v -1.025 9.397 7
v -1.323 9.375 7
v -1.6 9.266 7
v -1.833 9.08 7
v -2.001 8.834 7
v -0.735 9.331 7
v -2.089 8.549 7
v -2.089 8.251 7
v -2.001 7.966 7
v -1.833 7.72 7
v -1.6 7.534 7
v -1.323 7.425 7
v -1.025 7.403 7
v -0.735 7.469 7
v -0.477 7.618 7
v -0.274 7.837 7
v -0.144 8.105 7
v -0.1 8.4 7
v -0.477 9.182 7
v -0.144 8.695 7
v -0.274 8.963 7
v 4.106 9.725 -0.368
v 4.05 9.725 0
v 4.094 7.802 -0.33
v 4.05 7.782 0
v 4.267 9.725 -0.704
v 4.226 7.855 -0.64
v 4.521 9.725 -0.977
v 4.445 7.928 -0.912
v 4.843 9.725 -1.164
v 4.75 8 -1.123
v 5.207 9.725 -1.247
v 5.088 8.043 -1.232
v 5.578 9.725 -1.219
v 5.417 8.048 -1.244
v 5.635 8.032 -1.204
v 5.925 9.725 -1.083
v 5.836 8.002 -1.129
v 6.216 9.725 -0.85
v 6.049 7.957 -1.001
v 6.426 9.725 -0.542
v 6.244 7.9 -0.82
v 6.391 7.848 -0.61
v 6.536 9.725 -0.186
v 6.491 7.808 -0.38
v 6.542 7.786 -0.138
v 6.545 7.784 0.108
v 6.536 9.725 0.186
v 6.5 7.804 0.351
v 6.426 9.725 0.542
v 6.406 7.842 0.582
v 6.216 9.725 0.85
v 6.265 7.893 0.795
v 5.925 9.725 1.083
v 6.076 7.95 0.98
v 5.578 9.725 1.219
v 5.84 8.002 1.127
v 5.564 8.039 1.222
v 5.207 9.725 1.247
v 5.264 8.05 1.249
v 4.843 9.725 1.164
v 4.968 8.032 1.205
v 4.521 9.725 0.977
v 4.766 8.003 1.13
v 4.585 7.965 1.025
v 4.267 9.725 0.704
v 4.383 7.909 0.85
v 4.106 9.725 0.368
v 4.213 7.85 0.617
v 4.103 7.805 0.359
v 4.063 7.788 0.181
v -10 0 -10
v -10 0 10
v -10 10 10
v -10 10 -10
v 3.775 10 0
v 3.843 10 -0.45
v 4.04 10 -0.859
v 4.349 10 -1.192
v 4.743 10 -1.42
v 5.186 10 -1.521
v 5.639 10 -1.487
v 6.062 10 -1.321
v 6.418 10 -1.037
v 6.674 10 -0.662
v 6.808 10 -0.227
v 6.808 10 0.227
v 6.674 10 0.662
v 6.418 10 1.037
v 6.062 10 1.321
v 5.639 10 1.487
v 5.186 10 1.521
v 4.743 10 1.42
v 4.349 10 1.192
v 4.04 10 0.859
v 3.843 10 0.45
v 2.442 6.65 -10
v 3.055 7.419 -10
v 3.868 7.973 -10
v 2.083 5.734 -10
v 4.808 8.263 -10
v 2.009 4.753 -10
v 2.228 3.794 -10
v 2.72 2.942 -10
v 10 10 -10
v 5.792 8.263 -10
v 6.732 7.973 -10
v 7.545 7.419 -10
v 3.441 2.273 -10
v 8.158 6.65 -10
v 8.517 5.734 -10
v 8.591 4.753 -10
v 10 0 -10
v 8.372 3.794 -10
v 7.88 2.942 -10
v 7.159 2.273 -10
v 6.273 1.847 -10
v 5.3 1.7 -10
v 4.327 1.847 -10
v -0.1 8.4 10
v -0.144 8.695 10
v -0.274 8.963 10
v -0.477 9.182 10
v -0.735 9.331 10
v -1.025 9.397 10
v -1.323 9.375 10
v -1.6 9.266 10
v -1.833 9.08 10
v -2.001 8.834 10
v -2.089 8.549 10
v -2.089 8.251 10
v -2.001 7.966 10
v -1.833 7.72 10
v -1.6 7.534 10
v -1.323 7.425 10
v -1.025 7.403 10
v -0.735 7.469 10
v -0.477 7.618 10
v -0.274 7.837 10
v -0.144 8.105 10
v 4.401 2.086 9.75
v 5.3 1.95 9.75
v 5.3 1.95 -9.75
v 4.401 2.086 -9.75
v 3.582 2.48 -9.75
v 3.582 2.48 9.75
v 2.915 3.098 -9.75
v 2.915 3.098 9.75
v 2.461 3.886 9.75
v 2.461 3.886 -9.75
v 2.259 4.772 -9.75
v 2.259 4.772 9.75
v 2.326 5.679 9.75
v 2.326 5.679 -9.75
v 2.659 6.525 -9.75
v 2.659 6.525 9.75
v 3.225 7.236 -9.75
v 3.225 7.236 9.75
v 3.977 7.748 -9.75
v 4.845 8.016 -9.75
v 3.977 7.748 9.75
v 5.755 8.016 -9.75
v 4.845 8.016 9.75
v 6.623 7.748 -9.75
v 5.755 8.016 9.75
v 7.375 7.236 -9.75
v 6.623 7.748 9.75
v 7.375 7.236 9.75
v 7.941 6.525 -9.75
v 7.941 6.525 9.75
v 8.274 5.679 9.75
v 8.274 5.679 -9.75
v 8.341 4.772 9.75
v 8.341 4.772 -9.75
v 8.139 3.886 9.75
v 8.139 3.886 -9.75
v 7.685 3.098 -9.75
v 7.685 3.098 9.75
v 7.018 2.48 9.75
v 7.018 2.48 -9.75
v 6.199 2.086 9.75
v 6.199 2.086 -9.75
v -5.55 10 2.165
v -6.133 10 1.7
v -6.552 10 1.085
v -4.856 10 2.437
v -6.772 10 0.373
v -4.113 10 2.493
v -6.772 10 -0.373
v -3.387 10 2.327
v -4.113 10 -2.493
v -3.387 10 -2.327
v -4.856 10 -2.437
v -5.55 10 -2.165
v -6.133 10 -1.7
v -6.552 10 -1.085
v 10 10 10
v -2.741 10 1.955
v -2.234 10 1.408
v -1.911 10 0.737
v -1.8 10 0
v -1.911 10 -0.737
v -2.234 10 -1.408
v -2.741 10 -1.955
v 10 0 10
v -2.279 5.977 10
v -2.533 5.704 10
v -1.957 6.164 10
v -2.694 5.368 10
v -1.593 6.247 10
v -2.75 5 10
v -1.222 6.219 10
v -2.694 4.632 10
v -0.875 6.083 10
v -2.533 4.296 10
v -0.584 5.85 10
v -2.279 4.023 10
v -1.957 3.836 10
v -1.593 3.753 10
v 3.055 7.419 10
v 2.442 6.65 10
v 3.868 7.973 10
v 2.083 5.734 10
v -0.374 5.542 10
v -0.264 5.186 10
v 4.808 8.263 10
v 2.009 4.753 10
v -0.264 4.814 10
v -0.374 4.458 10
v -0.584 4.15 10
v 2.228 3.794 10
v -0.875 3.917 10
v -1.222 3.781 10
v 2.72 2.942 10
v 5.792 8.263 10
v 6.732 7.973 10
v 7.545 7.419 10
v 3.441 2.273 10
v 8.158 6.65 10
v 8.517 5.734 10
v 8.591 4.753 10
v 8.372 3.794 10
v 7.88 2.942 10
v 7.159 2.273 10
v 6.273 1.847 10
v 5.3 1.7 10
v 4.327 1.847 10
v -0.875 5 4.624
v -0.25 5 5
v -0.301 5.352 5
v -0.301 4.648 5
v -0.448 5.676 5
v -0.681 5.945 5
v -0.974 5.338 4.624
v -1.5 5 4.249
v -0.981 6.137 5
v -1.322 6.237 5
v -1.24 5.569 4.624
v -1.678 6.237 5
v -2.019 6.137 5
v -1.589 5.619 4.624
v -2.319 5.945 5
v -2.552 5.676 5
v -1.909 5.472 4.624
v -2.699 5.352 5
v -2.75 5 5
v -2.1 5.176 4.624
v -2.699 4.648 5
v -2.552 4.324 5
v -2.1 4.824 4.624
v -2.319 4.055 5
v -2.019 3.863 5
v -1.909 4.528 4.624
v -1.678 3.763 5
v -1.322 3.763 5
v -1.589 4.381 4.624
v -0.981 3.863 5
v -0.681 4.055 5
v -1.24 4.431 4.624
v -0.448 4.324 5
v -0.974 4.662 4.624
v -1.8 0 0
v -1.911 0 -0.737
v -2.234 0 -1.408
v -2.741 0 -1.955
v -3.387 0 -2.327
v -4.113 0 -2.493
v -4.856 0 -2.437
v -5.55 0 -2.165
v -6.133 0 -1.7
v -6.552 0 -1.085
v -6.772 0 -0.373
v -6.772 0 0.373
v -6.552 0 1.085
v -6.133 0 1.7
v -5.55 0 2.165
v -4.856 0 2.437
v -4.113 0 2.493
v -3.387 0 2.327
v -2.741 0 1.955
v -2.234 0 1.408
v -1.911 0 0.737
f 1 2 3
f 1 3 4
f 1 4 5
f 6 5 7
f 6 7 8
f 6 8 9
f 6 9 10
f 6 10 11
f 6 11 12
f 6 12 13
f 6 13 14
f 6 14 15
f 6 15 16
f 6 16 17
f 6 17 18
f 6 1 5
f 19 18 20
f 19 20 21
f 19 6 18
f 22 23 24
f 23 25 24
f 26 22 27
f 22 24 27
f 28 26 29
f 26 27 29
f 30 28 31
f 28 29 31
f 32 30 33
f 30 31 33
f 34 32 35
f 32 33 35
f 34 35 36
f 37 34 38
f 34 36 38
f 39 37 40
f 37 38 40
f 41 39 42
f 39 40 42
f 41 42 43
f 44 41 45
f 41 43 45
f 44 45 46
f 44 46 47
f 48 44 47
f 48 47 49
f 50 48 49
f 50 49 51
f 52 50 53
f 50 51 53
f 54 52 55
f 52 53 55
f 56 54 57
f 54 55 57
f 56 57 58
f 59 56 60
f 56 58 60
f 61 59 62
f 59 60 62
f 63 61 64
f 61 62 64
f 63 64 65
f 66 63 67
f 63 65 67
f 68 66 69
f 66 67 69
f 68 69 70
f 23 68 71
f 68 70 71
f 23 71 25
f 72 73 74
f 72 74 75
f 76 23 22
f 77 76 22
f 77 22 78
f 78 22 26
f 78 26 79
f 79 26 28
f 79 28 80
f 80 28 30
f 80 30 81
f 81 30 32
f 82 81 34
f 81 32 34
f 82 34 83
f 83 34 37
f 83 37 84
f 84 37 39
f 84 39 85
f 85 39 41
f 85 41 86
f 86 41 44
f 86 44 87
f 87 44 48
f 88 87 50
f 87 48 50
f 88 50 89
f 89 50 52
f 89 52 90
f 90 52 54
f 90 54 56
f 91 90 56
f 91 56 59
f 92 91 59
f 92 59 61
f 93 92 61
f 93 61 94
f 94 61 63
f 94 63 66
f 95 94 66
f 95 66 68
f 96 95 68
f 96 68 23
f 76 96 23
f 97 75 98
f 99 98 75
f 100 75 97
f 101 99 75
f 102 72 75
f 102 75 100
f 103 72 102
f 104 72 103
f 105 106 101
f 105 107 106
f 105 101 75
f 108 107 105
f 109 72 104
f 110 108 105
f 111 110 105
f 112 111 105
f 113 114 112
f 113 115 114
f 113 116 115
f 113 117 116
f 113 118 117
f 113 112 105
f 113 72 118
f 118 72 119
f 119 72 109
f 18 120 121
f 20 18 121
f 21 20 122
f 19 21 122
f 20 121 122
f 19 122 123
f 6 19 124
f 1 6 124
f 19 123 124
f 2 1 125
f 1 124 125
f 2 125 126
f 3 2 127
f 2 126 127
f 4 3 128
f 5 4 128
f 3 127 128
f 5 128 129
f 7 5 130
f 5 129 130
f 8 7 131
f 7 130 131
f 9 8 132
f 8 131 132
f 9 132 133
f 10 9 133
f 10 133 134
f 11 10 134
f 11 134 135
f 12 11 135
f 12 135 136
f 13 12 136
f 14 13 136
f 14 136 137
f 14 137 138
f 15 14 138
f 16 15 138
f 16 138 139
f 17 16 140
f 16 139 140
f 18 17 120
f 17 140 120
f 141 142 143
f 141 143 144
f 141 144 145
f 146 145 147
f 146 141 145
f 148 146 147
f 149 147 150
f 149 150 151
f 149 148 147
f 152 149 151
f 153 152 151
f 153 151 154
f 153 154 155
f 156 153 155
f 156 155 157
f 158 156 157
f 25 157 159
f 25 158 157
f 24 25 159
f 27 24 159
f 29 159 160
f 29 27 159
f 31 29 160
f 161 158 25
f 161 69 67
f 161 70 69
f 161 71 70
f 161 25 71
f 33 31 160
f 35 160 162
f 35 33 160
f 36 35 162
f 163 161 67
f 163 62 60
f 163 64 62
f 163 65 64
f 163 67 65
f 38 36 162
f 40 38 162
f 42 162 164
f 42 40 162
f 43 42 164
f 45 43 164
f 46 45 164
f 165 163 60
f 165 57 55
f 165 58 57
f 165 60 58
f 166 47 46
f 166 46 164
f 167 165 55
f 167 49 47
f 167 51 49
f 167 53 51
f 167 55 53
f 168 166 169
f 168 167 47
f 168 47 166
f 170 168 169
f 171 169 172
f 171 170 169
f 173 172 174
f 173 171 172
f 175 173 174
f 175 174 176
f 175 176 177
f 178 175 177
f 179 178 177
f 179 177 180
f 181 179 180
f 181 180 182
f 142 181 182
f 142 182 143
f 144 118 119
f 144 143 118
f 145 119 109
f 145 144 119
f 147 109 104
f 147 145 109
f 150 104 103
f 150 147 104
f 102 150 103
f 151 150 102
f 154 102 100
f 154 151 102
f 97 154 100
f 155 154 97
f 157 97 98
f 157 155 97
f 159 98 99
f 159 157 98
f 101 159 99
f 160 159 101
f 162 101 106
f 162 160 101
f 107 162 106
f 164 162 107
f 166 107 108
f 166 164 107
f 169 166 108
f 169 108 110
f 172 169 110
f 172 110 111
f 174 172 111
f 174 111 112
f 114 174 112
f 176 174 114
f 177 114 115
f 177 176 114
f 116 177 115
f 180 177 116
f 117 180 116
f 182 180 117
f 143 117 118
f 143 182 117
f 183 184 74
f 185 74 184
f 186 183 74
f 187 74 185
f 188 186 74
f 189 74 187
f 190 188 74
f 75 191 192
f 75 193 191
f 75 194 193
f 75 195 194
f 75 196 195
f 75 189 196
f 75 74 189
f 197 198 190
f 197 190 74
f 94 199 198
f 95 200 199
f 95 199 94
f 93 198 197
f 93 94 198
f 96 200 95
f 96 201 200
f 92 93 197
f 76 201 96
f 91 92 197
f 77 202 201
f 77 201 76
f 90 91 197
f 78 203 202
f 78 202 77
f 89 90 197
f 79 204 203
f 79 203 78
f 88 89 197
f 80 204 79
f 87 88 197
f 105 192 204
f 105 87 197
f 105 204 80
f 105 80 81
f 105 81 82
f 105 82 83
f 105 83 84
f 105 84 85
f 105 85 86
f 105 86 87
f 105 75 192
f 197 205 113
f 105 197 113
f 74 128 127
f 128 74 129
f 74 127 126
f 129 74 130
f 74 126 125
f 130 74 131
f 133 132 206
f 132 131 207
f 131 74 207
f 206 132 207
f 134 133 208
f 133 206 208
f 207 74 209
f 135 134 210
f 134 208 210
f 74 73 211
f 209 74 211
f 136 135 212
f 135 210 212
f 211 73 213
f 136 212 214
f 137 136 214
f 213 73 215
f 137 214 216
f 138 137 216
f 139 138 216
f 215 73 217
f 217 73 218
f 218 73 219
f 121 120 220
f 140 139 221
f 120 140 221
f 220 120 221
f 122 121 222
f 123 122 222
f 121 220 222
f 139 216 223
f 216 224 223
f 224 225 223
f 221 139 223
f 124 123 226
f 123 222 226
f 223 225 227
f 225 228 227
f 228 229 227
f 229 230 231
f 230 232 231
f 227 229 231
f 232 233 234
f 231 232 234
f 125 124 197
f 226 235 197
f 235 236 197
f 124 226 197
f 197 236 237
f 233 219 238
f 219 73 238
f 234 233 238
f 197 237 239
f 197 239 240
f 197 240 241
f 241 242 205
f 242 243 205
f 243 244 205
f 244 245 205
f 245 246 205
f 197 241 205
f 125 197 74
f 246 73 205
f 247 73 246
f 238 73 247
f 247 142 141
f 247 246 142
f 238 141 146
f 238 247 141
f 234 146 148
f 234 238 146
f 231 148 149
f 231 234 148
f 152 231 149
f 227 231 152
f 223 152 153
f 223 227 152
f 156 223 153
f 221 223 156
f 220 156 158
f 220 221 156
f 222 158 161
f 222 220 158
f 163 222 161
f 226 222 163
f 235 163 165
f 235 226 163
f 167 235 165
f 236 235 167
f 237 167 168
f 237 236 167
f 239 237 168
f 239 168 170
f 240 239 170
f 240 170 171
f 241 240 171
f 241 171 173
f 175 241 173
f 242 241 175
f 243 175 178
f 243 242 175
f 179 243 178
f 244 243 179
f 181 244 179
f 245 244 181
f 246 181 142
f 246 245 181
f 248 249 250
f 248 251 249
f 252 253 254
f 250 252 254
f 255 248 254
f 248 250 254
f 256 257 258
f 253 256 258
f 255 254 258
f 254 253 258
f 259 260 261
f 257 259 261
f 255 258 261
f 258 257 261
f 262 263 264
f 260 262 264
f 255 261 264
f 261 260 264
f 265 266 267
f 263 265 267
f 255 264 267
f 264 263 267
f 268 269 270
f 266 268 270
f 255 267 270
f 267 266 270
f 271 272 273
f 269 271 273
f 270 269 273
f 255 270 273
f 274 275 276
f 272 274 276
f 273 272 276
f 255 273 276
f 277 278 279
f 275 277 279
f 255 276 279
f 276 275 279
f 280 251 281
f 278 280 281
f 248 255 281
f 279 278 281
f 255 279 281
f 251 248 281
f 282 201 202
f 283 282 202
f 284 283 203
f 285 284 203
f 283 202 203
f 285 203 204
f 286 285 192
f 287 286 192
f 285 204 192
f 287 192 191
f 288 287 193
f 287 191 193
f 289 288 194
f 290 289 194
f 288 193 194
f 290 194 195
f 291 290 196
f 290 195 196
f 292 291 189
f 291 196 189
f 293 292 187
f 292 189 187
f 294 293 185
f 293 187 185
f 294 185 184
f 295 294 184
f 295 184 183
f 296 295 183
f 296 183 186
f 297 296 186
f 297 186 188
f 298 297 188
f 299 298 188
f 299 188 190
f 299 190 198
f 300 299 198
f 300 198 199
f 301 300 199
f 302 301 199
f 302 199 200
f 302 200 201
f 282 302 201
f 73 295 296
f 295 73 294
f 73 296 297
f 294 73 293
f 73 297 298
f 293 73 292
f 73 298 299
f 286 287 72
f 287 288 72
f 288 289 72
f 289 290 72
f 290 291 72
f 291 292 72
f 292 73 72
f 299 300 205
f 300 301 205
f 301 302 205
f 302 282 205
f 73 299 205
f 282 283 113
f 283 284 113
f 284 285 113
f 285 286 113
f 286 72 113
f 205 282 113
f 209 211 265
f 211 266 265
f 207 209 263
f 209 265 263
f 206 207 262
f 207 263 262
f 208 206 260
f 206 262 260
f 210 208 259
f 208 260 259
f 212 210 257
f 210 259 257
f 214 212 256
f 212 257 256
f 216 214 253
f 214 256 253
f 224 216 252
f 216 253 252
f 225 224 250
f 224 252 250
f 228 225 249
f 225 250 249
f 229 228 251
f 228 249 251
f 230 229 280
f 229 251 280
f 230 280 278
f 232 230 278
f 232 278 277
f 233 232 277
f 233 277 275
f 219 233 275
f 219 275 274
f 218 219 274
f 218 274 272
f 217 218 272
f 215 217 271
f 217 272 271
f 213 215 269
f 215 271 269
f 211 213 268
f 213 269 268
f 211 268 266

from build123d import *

# Parameters (mm, degrees)
SKETCH_1_W                   = 20
SKETCH_1_H                   = 20
EXTRUDE_1_DEPTH              = 10
HOLE_WIZARD_M3_2_D           = 2.5
HOLE_WIZARD_M3_2_DEPTH       = 5
HOLE_WIZARD_M3_2_TIP         = 0.751075774
HOLE_WIZARD_M3_3_D           = 2.5
HOLE_WIZARD_M3_3_DEPTH       = 6
HOLE_WIZARD_M3_3_CSINK_D     = 3.05
HOLE_WIZARD_M3_3_CSINK_ANGLE = 90
HOLE_WIZARD_M3_3_TIP         = 1.25
SKETCH_23_R                  = 2.5
CUT_EXTRUDE_1_DEPTH          = 11
SKETCH_40_R                  = 1
CUT_EXTRUDE_2_DEPTH          = 3


with BuildPart() as part:
    # 草图1 → 凸台-拉伸1 (new body)
    with BuildSketch(Plane(origin=(0, 0, 0), x_dir=(1, 0, 0), z_dir=(0, 1, 0))):
        Rectangle(SKETCH_1_W, SKETCH_1_H)
    extrude(amount=EXTRUDE_1_DEPTH)

    # 草图26 → Ø6.1 (6.1) 直径孔1 (revolve, cut)
    with BuildSketch(Plane(origin=(5.3, 5, 10), x_dir=(0, -1, 0), z_dir=(1, 0, 0))):
        Polygon((0, 0), (0, 20), (3.3, 20), (3.05, 19.75), (3.05, 0.25), (3.3, 0), align=None)
    revolve(axis=Axis((5.3, 5, 16.35), (0, 0, -1)), mode=Mode.SUBTRACT)

    # M3 螺纹孔2
    with Locations(Plane.XY.offset(10)):
        with Locations((-1.5, 5)):
            Hole(HOLE_WIZARD_M3_2_D / 2, depth=HOLE_WIZARD_M3_2_DEPTH)
            with Locations((0, 0, -(HOLE_WIZARD_M3_2_DEPTH + HOLE_WIZARD_M3_2_TIP / 2))):  # 118° drill point
                Cone(0, HOLE_WIZARD_M3_2_D / 2, HOLE_WIZARD_M3_2_TIP, mode=Mode.SUBTRACT)

    # M3 螺纹孔3
    with Locations(Plane(origin=(0, 10, 0), x_dir=(1, 0, 0), z_dir=(0, 1, 0))):
        with Locations((5.3, 0)):
            CounterSinkHole(HOLE_WIZARD_M3_3_D / 2, HOLE_WIZARD_M3_3_CSINK_D / 2, depth=HOLE_WIZARD_M3_3_DEPTH, counter_sink_angle=HOLE_WIZARD_M3_3_CSINK_ANGLE)
            with Locations((0, 0, -(HOLE_WIZARD_M3_3_DEPTH + HOLE_WIZARD_M3_3_TIP / 2))):  # 90° drill point
                Cone(0, HOLE_WIZARD_M3_3_D / 2, HOLE_WIZARD_M3_3_TIP, mode=Mode.SUBTRACT)

    # 草图23 → 切除-拉伸1 (cut, through all)
    with BuildSketch(Plane(origin=(0, 10, 0), x_dir=(1, 0, 0), z_dir=(0, 1, 0))):
        with Locations((-4.3, 0)):
            Circle(SKETCH_23_R)
    extrude(amount=-CUT_EXTRUDE_1_DEPTH, mode=Mode.SUBTRACT)

    # 草图40 → 切除-拉伸2 (cut)
    with BuildSketch(Plane.XY.offset(10)):
        with Locations((-1.1, 8.4)):
            Circle(SKETCH_40_R)
    extrude(amount=-CUT_EXTRUDE_2_DEPTH, mode=Mode.SUBTRACT)


solid = part.part
